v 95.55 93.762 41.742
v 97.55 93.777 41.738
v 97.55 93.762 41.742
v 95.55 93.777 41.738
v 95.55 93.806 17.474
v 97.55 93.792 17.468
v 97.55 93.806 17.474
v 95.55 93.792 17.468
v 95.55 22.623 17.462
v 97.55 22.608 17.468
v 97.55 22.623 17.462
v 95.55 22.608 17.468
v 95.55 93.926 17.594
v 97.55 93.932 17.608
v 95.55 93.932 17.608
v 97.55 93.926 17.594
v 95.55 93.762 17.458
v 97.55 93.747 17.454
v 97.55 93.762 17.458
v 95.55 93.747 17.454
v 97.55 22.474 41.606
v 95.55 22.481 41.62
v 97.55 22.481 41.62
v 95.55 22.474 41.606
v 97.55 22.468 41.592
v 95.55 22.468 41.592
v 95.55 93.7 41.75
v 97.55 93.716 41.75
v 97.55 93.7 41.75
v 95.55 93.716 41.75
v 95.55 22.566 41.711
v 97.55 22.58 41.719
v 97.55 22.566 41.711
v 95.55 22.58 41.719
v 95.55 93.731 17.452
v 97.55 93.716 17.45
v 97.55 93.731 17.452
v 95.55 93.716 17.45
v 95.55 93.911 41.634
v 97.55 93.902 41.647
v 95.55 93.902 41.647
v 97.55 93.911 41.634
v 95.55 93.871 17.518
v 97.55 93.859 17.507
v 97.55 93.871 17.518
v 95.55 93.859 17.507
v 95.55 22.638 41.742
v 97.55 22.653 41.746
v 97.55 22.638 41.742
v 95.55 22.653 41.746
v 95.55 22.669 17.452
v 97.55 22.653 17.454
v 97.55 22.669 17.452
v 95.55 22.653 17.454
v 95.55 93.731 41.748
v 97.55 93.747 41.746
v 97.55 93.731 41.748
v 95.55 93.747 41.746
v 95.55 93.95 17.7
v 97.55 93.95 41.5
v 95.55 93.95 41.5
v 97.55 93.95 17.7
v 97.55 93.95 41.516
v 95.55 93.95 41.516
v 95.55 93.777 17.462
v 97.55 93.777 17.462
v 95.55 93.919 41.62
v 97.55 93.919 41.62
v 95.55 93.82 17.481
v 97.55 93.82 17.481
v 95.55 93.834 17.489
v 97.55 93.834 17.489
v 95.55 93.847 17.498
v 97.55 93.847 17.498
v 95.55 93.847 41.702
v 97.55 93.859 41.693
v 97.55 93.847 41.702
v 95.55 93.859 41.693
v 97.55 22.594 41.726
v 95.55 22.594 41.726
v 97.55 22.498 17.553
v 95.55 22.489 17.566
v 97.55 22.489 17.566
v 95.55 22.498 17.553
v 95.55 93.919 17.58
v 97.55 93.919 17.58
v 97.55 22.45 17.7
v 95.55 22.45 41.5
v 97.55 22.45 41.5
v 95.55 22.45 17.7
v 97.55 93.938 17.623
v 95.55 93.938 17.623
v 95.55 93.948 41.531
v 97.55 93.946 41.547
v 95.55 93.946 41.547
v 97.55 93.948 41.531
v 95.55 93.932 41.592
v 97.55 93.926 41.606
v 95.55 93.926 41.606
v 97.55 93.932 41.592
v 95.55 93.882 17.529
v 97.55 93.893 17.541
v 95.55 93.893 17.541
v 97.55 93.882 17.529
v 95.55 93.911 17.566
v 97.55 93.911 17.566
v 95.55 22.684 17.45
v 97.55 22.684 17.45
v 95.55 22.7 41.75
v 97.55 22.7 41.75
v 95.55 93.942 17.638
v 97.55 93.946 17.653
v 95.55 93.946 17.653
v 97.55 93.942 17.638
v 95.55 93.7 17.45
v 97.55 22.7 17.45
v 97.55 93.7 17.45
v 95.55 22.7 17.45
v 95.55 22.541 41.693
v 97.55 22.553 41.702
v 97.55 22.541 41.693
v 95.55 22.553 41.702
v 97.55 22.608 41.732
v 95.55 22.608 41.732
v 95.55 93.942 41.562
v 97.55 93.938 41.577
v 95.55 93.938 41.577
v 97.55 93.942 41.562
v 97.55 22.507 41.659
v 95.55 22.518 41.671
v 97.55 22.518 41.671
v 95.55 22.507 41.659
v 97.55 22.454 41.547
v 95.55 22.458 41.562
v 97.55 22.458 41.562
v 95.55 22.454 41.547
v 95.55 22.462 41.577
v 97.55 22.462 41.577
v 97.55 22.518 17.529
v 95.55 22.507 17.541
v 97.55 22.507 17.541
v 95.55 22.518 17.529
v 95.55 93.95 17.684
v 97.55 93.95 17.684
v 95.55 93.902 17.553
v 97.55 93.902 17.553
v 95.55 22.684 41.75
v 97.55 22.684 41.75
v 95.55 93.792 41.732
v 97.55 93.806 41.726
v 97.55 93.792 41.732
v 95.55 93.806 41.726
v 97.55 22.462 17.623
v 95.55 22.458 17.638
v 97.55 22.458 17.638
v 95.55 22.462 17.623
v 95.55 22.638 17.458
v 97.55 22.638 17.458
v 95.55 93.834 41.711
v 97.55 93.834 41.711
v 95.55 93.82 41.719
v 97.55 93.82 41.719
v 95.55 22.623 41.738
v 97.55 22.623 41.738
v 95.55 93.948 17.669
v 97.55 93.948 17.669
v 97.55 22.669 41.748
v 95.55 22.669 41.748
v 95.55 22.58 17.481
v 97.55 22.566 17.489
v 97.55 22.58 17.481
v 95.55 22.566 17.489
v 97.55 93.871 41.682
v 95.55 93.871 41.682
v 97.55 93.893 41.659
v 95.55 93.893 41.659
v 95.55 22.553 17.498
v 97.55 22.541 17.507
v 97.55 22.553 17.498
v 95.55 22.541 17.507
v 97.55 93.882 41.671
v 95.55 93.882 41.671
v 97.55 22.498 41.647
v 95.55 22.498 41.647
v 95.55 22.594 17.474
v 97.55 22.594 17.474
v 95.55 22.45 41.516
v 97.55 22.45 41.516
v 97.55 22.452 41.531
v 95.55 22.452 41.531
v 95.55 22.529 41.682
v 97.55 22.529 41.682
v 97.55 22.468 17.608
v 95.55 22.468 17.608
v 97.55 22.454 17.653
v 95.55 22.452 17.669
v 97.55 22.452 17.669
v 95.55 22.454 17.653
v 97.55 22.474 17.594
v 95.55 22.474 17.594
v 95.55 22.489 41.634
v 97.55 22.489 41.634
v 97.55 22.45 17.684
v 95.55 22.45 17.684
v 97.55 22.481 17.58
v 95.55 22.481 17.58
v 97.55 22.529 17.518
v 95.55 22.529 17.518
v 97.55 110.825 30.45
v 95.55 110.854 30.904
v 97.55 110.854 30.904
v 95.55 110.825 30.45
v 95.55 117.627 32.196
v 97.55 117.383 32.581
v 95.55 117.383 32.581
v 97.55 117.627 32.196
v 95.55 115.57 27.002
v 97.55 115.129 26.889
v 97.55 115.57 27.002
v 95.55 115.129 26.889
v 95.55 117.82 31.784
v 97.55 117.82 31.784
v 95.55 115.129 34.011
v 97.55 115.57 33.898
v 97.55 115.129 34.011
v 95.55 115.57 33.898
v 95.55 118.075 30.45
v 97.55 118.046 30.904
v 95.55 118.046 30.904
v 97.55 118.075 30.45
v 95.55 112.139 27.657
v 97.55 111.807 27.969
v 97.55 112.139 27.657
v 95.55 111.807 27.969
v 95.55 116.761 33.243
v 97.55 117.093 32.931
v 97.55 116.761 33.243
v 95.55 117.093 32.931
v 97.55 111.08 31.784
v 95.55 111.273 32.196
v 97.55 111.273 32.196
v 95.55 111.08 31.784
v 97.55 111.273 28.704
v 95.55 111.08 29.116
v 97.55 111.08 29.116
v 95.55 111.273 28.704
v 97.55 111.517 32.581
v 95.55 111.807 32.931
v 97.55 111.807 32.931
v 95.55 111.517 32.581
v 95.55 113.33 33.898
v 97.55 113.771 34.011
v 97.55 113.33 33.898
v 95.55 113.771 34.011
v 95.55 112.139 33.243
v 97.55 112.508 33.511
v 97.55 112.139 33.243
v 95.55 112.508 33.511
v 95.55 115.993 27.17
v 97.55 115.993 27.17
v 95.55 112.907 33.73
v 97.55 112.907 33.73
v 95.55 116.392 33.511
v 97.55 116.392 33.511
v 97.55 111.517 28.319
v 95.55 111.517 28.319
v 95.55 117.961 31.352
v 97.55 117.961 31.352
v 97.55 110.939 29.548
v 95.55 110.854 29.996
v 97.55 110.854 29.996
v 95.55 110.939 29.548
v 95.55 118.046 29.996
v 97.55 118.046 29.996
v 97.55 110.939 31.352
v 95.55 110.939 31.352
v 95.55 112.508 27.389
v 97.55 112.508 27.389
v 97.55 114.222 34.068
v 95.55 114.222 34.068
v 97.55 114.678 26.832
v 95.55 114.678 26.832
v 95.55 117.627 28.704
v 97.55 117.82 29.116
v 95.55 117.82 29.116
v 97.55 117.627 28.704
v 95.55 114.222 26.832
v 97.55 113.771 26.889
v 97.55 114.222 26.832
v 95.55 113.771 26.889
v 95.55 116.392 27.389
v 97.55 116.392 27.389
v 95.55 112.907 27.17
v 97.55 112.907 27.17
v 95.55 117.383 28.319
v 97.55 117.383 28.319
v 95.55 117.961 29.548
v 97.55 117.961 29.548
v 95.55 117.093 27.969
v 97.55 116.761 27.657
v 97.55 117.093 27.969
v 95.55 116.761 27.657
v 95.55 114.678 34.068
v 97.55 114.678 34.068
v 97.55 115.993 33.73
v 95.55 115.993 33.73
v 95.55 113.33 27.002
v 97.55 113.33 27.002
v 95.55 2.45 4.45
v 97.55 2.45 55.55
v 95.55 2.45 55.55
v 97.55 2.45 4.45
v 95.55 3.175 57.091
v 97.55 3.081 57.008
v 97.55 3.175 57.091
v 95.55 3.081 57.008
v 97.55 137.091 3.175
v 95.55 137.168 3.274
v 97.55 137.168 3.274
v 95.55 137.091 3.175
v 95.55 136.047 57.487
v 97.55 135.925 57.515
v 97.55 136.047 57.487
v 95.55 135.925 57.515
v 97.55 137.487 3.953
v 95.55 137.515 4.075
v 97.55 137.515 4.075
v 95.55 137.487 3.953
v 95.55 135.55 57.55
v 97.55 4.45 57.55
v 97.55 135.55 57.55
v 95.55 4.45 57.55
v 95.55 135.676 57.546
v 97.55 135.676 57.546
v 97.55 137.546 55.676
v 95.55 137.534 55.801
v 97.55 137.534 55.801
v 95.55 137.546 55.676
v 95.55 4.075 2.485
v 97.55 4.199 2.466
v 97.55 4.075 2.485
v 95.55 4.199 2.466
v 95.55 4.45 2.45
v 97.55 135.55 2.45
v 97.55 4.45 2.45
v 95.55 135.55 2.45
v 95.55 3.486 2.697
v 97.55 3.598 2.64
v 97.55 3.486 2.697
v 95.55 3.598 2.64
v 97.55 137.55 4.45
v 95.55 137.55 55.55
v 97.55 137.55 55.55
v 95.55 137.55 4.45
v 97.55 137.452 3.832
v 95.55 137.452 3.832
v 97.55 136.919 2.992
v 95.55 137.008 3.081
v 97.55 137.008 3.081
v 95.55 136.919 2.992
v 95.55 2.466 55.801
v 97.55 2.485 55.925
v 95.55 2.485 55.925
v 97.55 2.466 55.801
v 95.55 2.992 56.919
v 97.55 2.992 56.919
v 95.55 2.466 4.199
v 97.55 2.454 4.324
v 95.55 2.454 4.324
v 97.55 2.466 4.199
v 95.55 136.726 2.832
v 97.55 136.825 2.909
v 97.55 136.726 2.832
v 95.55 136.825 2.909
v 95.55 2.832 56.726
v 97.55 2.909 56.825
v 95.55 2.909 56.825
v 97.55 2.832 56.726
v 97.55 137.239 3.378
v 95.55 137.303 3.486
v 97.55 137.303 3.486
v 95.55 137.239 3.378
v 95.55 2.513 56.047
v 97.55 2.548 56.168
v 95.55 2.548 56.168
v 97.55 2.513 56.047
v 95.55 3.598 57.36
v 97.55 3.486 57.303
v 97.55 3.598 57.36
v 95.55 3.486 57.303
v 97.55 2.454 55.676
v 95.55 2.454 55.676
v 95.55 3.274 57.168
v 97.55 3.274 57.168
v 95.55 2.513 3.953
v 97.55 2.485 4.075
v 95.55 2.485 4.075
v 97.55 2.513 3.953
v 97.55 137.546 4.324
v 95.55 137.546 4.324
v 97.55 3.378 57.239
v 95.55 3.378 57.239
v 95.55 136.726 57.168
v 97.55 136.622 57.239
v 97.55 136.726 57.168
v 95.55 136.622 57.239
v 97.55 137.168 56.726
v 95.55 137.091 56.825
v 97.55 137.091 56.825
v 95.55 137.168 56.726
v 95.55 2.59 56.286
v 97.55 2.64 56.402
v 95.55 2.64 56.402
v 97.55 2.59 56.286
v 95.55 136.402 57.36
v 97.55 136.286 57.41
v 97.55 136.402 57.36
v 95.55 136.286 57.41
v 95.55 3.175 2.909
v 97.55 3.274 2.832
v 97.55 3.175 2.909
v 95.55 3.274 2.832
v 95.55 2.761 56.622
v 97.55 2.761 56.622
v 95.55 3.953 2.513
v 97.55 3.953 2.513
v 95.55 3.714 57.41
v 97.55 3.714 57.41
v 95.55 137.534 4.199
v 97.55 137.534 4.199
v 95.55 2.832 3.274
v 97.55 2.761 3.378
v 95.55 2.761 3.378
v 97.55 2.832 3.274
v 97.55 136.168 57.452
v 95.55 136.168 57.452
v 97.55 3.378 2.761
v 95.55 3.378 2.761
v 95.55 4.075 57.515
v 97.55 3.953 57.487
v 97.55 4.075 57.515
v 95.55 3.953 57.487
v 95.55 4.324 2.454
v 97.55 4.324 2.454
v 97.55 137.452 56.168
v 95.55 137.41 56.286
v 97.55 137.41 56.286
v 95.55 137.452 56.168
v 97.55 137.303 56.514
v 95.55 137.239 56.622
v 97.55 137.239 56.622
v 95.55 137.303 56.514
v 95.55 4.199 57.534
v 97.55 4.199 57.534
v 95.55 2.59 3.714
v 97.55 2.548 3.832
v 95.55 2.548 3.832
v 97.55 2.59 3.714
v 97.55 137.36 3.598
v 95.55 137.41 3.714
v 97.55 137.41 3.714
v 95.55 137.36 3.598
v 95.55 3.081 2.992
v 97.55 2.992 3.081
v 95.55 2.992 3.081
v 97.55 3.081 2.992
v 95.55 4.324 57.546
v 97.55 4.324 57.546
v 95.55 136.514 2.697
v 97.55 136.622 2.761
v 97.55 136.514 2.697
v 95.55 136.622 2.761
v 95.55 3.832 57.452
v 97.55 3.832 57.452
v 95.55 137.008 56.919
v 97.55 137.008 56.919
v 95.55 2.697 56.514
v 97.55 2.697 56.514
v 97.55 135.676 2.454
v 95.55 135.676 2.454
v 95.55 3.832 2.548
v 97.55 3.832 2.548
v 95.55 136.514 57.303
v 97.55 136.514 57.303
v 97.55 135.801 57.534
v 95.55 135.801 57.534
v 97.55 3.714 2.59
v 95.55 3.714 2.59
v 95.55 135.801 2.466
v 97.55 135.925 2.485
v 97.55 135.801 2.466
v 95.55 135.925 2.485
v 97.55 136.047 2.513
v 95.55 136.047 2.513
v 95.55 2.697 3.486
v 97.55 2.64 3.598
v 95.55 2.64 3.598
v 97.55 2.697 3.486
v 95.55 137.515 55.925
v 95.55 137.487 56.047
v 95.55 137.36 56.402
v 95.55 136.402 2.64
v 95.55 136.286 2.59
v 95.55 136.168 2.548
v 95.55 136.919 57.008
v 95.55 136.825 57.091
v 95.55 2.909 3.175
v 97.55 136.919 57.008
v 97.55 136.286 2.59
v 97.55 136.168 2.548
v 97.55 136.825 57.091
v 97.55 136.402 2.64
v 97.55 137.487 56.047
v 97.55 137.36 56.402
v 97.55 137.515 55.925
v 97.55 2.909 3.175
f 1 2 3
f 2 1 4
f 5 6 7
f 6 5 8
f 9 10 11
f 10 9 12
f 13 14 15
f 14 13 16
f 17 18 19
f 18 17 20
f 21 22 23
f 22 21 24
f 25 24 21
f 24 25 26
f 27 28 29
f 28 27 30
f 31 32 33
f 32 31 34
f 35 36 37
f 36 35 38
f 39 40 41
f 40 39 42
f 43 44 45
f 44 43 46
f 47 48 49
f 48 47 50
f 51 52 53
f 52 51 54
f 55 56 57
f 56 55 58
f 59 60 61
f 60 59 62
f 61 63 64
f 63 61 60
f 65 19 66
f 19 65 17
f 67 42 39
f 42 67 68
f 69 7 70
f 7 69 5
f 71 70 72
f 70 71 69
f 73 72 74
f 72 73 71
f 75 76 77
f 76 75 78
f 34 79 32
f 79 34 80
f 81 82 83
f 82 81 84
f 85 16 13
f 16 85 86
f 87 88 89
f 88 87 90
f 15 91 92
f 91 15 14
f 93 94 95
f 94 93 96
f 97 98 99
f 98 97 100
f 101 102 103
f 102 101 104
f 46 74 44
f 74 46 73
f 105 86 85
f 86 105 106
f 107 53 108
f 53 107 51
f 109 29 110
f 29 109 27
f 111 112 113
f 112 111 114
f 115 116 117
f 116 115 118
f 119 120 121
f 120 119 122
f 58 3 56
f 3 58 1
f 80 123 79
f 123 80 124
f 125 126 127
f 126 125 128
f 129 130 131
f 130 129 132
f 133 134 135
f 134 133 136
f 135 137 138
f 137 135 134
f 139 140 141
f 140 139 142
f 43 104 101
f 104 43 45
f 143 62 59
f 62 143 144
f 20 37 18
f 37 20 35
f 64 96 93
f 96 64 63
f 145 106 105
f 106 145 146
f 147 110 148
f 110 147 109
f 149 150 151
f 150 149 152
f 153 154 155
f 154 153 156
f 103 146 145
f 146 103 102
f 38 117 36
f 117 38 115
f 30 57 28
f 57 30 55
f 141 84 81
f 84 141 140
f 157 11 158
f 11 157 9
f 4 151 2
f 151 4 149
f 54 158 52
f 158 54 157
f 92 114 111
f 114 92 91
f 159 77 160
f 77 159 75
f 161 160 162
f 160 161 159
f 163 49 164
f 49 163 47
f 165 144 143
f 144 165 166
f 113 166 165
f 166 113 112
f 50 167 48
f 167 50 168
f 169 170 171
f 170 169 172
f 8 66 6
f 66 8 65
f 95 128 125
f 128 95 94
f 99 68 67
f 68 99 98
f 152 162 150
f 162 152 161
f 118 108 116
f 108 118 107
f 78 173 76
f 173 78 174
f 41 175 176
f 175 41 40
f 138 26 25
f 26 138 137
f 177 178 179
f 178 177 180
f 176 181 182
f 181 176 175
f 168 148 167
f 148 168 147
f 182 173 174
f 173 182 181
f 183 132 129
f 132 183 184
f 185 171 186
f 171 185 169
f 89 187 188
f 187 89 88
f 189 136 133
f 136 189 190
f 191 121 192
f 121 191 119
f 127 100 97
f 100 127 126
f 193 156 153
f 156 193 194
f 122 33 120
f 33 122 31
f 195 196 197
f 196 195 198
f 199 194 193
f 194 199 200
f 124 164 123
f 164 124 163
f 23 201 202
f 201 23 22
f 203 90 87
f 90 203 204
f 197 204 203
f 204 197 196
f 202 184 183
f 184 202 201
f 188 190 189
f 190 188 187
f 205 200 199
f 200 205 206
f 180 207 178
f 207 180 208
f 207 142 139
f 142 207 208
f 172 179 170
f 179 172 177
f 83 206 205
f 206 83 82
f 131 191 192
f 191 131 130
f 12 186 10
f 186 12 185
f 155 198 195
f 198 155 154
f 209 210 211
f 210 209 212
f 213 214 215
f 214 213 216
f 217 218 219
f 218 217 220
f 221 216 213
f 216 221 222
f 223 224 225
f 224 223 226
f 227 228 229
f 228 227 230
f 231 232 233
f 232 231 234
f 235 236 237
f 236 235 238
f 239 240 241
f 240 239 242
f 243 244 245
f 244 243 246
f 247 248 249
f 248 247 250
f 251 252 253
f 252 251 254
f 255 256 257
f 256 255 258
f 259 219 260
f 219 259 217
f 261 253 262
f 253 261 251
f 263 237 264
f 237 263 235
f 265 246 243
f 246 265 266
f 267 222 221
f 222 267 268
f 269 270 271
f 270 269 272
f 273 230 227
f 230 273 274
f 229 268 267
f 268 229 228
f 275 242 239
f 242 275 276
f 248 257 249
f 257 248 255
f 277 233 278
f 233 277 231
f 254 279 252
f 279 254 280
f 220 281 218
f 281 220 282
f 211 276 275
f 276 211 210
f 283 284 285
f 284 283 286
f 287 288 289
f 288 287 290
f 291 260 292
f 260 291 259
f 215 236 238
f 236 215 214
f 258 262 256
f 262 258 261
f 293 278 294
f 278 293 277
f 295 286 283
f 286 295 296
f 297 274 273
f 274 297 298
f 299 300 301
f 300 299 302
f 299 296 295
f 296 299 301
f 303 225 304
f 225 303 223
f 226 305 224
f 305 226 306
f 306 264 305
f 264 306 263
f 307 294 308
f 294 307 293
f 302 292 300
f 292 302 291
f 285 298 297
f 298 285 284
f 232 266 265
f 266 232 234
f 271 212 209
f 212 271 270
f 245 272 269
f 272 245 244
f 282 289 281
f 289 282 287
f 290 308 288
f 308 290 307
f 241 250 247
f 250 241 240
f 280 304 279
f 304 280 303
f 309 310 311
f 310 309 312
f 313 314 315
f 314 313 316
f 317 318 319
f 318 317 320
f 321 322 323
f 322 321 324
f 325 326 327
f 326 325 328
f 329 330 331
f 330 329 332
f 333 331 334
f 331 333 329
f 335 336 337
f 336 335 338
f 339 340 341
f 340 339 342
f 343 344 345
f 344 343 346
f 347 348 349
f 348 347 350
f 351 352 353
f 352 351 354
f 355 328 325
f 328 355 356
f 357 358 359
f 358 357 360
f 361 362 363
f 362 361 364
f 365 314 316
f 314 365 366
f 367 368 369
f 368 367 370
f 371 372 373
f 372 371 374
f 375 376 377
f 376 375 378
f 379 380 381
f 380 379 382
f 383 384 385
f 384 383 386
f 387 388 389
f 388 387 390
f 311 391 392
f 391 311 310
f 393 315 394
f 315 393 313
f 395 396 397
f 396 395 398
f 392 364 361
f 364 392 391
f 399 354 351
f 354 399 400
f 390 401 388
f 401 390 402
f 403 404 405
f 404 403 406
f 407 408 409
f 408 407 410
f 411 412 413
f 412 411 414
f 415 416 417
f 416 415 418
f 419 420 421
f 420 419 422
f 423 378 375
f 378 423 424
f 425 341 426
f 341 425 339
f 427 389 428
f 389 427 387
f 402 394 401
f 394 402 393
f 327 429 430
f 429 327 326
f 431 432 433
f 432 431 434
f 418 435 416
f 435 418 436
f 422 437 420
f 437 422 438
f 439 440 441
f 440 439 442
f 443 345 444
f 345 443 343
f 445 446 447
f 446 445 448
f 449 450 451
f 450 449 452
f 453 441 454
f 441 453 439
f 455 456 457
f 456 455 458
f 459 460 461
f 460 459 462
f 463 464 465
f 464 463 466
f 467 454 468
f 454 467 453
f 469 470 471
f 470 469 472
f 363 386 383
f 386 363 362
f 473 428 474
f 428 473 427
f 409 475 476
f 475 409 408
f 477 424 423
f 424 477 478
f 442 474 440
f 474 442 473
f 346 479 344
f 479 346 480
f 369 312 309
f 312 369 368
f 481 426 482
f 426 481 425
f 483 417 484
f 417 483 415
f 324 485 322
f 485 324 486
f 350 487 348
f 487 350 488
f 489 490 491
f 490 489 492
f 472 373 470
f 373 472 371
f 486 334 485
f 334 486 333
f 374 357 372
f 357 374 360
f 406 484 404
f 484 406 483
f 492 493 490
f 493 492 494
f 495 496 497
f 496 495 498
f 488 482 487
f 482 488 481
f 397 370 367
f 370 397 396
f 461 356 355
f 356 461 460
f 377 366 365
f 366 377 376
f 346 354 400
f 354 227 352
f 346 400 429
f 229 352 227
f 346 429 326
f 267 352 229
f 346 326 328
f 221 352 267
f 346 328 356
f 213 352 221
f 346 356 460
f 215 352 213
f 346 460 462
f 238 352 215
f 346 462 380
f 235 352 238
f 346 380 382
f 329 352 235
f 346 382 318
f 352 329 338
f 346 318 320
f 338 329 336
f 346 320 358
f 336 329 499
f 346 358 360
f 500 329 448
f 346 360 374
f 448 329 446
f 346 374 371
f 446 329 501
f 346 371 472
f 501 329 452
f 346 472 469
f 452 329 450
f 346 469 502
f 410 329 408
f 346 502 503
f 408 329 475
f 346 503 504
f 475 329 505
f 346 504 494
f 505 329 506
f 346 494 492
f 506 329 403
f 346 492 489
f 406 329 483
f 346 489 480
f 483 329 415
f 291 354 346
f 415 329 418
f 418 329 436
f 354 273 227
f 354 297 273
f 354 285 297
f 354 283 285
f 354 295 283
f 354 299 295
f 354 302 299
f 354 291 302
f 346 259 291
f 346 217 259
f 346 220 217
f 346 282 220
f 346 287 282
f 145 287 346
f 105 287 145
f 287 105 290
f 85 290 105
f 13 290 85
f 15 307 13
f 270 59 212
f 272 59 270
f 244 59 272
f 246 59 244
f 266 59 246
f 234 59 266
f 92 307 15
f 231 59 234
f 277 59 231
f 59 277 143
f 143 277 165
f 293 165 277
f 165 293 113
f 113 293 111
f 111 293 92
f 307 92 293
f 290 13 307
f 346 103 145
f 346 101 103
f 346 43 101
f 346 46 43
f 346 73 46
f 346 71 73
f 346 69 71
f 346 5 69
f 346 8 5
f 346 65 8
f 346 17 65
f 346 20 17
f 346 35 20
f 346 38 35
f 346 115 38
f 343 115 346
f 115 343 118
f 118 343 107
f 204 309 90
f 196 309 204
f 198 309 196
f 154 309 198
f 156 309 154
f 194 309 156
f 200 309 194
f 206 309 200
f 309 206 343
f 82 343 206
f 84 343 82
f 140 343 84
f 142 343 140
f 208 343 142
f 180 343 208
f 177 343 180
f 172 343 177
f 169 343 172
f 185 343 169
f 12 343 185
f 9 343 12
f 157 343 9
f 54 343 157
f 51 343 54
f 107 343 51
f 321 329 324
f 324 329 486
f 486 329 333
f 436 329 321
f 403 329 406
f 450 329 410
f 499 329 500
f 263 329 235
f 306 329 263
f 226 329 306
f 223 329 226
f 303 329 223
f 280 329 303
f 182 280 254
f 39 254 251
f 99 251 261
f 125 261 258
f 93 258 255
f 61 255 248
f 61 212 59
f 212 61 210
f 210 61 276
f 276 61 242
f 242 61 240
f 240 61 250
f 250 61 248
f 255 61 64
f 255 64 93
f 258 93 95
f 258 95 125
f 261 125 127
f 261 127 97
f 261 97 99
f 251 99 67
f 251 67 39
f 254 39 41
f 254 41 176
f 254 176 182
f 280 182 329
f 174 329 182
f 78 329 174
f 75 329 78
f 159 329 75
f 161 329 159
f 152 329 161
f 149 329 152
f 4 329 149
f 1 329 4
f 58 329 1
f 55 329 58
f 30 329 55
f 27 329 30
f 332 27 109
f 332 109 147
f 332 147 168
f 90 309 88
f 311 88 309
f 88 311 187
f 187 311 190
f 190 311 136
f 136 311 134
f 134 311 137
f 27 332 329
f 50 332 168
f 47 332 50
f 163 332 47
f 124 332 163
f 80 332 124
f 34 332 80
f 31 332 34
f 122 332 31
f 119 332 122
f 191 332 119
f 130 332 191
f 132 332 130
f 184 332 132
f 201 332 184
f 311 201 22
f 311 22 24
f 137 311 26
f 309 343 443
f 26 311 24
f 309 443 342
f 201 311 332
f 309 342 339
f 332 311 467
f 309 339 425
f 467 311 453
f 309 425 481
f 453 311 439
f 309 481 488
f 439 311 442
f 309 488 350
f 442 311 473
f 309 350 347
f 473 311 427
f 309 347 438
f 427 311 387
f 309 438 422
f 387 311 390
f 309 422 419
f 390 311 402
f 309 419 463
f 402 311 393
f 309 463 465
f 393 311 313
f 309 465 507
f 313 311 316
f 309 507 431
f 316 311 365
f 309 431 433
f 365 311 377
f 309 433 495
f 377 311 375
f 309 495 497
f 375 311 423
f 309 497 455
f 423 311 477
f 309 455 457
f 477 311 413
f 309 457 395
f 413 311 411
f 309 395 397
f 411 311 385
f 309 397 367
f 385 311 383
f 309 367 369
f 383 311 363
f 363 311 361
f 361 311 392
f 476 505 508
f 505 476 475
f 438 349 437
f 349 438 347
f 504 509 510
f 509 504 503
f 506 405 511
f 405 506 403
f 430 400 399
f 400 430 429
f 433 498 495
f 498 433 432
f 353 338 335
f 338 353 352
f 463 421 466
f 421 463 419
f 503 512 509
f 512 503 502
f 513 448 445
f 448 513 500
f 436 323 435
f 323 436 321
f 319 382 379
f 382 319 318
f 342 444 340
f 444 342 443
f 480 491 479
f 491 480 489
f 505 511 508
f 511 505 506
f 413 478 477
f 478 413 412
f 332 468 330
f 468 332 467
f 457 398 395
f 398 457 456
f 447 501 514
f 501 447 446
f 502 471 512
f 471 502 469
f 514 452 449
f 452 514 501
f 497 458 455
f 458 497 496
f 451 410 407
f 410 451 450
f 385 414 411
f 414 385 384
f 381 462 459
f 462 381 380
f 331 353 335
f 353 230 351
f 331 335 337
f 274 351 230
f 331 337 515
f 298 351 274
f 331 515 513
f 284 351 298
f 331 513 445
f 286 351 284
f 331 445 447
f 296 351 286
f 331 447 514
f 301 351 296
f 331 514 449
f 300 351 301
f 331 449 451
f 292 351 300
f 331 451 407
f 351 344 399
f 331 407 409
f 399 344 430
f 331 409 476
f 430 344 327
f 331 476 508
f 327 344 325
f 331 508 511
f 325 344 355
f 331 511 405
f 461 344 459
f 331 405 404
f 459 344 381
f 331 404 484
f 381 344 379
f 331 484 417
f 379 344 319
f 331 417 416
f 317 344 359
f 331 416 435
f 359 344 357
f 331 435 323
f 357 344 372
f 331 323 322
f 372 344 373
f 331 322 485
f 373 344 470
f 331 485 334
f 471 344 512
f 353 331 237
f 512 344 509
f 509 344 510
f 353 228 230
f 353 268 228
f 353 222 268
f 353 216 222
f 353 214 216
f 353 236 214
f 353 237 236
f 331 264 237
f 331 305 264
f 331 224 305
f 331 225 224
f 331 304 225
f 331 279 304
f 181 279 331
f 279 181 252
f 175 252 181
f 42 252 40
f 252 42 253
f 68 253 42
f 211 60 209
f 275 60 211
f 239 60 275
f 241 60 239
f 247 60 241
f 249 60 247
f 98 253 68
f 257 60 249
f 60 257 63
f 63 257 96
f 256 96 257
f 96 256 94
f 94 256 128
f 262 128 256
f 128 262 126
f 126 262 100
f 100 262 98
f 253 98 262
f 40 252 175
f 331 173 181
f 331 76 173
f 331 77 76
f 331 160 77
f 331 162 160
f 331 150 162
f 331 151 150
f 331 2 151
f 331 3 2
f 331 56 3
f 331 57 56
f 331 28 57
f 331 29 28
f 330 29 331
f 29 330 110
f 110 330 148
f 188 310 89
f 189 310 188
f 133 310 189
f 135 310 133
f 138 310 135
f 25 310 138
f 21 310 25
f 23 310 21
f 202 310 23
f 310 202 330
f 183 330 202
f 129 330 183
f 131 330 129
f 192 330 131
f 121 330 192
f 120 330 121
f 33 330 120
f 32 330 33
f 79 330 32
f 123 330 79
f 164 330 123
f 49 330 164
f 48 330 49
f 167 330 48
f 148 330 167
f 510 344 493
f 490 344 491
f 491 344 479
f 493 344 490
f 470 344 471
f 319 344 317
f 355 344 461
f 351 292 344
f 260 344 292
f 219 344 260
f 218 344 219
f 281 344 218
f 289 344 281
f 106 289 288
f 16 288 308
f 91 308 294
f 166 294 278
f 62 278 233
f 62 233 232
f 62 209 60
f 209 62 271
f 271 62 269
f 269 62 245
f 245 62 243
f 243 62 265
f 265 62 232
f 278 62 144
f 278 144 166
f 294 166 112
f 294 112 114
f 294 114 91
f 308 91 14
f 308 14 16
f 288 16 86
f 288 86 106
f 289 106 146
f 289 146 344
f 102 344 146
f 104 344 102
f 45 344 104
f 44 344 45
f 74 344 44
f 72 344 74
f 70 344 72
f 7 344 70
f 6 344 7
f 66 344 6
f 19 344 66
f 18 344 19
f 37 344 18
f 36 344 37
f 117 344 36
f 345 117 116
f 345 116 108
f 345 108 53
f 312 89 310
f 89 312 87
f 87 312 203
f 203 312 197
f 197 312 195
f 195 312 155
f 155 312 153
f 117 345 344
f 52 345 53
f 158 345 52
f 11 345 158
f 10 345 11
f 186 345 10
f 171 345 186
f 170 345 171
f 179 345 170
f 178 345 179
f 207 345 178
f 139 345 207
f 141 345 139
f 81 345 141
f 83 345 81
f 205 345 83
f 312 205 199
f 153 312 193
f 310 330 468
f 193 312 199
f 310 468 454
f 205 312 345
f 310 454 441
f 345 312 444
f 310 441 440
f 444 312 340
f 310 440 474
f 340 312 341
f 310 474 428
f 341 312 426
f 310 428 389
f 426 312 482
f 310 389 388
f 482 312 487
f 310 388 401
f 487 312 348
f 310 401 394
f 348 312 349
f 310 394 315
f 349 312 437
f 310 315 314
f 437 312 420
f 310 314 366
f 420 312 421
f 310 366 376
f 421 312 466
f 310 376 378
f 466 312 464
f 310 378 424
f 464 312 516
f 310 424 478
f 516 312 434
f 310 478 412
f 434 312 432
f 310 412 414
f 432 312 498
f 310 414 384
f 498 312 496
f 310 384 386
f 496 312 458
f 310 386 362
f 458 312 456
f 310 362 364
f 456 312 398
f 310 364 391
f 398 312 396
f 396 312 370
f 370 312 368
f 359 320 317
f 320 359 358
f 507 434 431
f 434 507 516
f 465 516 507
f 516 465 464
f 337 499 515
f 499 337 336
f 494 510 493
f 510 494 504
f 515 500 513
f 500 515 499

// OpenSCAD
/*//////////////////////////////////////////////////////////////////
              -    FB Aka Heartman/Hearty 2016     -                   
              -   http://heartygfx.blogspot.com    -                  
              -       OpenScad Parametric Box      -                     
              -         CC BY-NC 3.0 License       -                      
////////////////////////////////////////////////////////////////////                                                                                                             
12/02/2016 - Fixed minor bug 
28/02/2016 - Added holes ventilation option                    
09/03/2016 - Added PCB feet support, fixed the shell artefact on export mode. 

*/////////////////////////// - Info - //////////////////////////////

// All coordinates are starting as integrated circuit pins.
// From the top view :

//   CoordD           <---       CoordC
//                                 ^
//                                 ^
//                                 ^
//   CoordA           --->       CoordB


////////////////////////////////////////////////////////////////////


////////// - Paramètres de la boite - Box parameters - /////////////

/* [Box dimensions] */
// - Longueur - Length  
  Length        = 100;       
// - Largeur - Width
  Width         = 140;                     
// - Hauteur - Height  
  Height        = 60;  
// - Epaisseur - Wall thickness  
  Thick         = 2;//[2:5]  
  
/* [Box options] */
// - Diamètre Coin arrondi - Filet diameter  
  Filet         = 2;//[0.1:12] 
// - lissage de l'arrondi - Filet smoothness  
  Resolution    = 50;//[1:100] 
// - Tolérance - Tolerance (Panel/rails gap)
  m             = 0.9;
// Pieds PCB - PCB feet (x4) 
  PCBFeet       = 0;// [0:No, 1:Yes]
// - Decorations to ventilation holes
  Vent          = 1;// [0:No, 1:Yes]
// - Decoration-Holes width (in mm)
  Vent_width    = 1.5;   


  
/* [PCB_Feet] */
//All dimensions are from the center foot axis

// - Coin bas gauche - Low left corner X position
PCBPosX         = -1;
// - Coin bas gauche - Low left corner Y position
PCBPosY         =  10;
// - Longueur PCB - PCB Length
PCBLength       = 55;
// - Largeur PCB - PCB Width
PCBWidth        = 75;
// - Heuteur pied - Feet height
FootHeight      = 10;
// - Diamètre pied - Foot diameter
FootDia         = 5;
// - Diamètre trou - Hole diameter
FootHole        = 2;  
  

/* [STL element to export] */
//Coque haut - Top shell
TShell          = 0;// [0:No, 1:Yes]
//Coque bas- Bottom shell
BShell          = 0;// [0:No, 1:Yes]
//Panneau avant - Front panel
FPanL           = 1;// [0:No, 1:Yes]
//Panneau arrière - Back panel  
BPanL           = 0;// [0:No, 1:Yes]


  
/* [Hidden] */
// - Couleur coque - Shell color  
Couleur1        = "Orange";       
// - Couleur panneaux - Panels color    
Couleur2        = "OrangeRed";    
// Thick X 2 - making decorations thicker if it is a vent to make sure they go through shell
Dec_Thick       = Vent ? Thick*2 : Thick; 
// - Depth decoration
Dec_size        = Vent ? Thick*2 : 0.8;





/////////// - Boitier générique bord arrondis - Generic rounded box - //////////

module RoundBox($a=Length, $b=Width, $c=Height){// Cube bords arrondis
                    $fn=Resolution;            
                    translate([0,Filet,Filet]){  
                    minkowski (){                                              
                        cube ([$a-(Length/2),$b-(2*Filet),$c-(2*Filet)], center = false);
                        rotate([0,90,0]){    
                        cylinder(r=Filet,h=Length/2, center = false);
                            } 
                        }
                    }
                }// End of RoundBox Module

      
////////////////////////////////// - Module Coque/Shell - //////////////////////////////////         

module Coque(){//Coque - Shell  
    Thick = Thick*2;  
    difference(){    
        difference(){//sides decoration
            union(){    
                     difference() {//soustraction de la forme centrale - Substraction Fileted box
                      
                        difference(){//soustraction cube median - Median cube slicer
                            union() {//union               
                            difference(){//Coque    
                                RoundBox();
                                translate([Thick/2,Thick/2,Thick/2]){     
                                        RoundBox($a=Length-Thick, $b=Width-Thick, $c=Height-Thick);
                                        }
                                        }//Fin diff Coque                            
                                difference(){//largeur Rails        
                                     translate([Thick+m,Thick/2,Thick/2]){// Rails
                                          RoundBox($a=Length-((2*Thick)+(2*m)), $b=Width-Thick, $c=Height-(Thick*2));
                                                          }//fin Rails
                                     translate([((Thick+m/2)*1.55),Thick/2,Thick/2+0.1]){ // +0.1 added to avoid the artefact
                                          RoundBox($a=Length-((Thick*3)+2*m), $b=Width-Thick, $c=Height-Thick);
                                                    }           
                                                }//Fin largeur Rails
                                    }//Fin union                                   
                               translate([-Thick,-Thick,Height/2]){// Cube à soustraire
                                    cube ([Length+100, Width+100, Height], center=false);
                                            }                                            
                                      }//fin soustraction cube median - End Median cube slicer
                               translate([-Thick/2,Thick,Thick]){// Forme de soustraction centrale 
                                    RoundBox($a=Length+Thick, $b=Width-Thick*2, $c=Height-Thick);       
                                    }                          
                                }                                          


                difference(){// wall fixation box legs
                    union(){
                        translate([3*Thick +5,Thick,Height/2]){
                            rotate([90,0,0]){
                                    $fn=6;
                                    cylinder(d=16,Thick/2);
                                    }   
                            }
                            
                       translate([Length-((3*Thick)+5),Thick,Height/2]){
                            rotate([90,0,0]){
                                    $fn=6;
                                    cylinder(d=16,Thick/2);
                                    }   
                            }

                        }
                            translate([4,Thick+Filet,Height/2-57]){   
                             rotate([45,0,0]){
                                   cube([Length,40,40]);    
                                  }
                           }
                           translate([0,-(Thick*1.46),Height/2]){
                                cube([Length,Thick*2,10]);
                           }
                    } //Fin fixation box legs
            }

        union(){// outbox sides decorations
            
            for(i=[0:Thick:Length/4]){

                // Ventilation holes part code submitted by Ettie - Thanks ;) 
                    translate([10+i,-Dec_Thick+Dec_size,1]){
                    cube([Vent_width,Dec_Thick,Height/4]);
                    }
                    translate([(Length-10) - i,-Dec_Thick+Dec_size,1]){
                    cube([Vent_width,Dec_Thick,Height/4]);
                    }
                    translate([(Length-10) - i,Width-Dec_size,1]){
                    cube([Vent_width,Dec_Thick,Height/4]);
                    }
                    translate([10+i,Width-Dec_size,1]){
                    cube([Vent_width,Dec_Thick,Height/4]);
                    }
  
                
                    }// fin de for
               // }
                }//fin union decoration
            }//fin difference decoration


            union(){ //sides holes
                $fn=50;
                translate([3*Thick+5,20,Height/2+4]){
                    rotate([90,0,0]){
                    cylinder(d=2,20);
                    }
                }
                translate([Length-((3*Thick)+5),20,Height/2+4]){
                    rotate([90,0,0]){
                    cylinder(d=2,20);
                    }
                }
                translate([3*Thick+5,Width+5,Height/2-4]){
                    rotate([90,0,0]){
                    cylinder(d=2,20);
                    }
                }
                translate([Length-((3*Thick)+5),Width+5,Height/2-4]){
                    rotate([90,0,0]){
                    cylinder(d=2,20);
                    }
                }
            }//fin de sides holes

        }//fin de difference holes
}// fin coque 

////////////////////////////// - Experiment - ///////////////////////////////////////////





/////////////////////// - Foot with base filet - /////////////////////////////
module foot(FootDia,FootHole,FootHeight){
    Filet=2;
    color(Couleur1)   
    translate([0,0,Filet-1.5])
    difference(){
    
    difference(){
            //translate ([0,0,-Thick]){
                cylinder(d=FootDia+Filet,FootHeight-Thick, $fn=100);
                        //}
                    rotate_extrude($fn=100){
                            translate([(FootDia+Filet*2)/2,Filet,0]){
                                    minkowski(){
                                            square(10);
                                            circle(Filet, $fn=100);
                                        }
                                 }
                           }
                   }
            cylinder(d=FootHole,FootHeight+1, $fn=100);
               }          
}// Fin module foot
  
module Feet(){     
//////////////////// - PCB only visible in the preview mode - /////////////////////    
    translate([3*Thick+2,Thick+5,FootHeight+(Thick/2)-0.5]){
    
    %square ([PCBLength+10,PCBWidth+10]);
       translate([PCBLength/2,PCBWidth/2,0.5]){ 
        color("Olive")
        %text("PCB", halign="center", valign="center", font="Arial black");
       }
    } // Fin PCB 
  
    
////////////////////////////// - 4 Feet - //////////////////////////////////////////     
    translate([3*Thick+7,Thick+10,Thick/2]){
        foot(FootDia,FootHole,FootHeight);
    }
    translate([(3*Thick)+PCBLength+7,Thick+10,Thick/2]){
        foot(FootDia,FootHole,FootHeight);
        }
    translate([(3*Thick)+PCBLength+7,(Thick)+PCBWidth+10,Thick/2]){
        foot(FootDia,FootHole,FootHeight);
        }        
    translate([3*Thick+7,(Thick)+PCBWidth+10,Thick/2]){
        foot(FootDia,FootHole,FootHeight);
    }   

} // Fin du module Feet
 


 
 ////////////////////////////////////////////////////////////////////////
////////////////////// <- Holes Panel Manager -> ///////////////////////
////////////////////////////////////////////////////////////////////////

//                           <- Panel ->  
module Panel(Length,Width,Thick,Filet){
    scale([0.5,1,1])
    minkowski(){
            cube([Thick,Width-(Thick*2+Filet*2+m),Height-(Thick*2+Filet*2+m)]);
            translate([0,Filet,Filet])
            rotate([0,90,0])
            cylinder(r=Filet,h=Thick, $fn=100);
      }
}



//                          <- Circle hole -> 
// Cx=Cylinder X position | Cy=Cylinder Y position | Cdia= Cylinder dia | Cheight=Cyl height
module CylinderHole(OnOff,Cx,Cy,Cdia){
    if(OnOff==1)
    translate([Cx,Cy,-1])
        cylinder(d=Cdia,10, $fn=50);
}
//                          <- Square hole ->  
// Sx=Square X position | Sy=Square Y position | Sl= Square Length | Sw=Square Width | Filet = Round corner
module SquareHole(OnOff,Sx,Sy,Sl,Sw,Filet){
    if(OnOff==1)
     minkowski(){
        translate([Sx+Filet/2,Sy+Filet/2,-1])
            cube([Sl-Filet,Sw-Filet,10]);
            cylinder(d=Filet,h=10, $fn=100);
       }
}


 
//                      <- Linear text panel -> 
module LText(OnOff,Tx,Ty,Font,Size,Content){
    if(OnOff==1)
    translate([Tx,Ty,Thick+.5])
    linear_extrude(height = 0.5){
    text(Content, size=Size, font=Font);
    }
}
//                     <- Circular text panel->  
module CText(OnOff,Tx,Ty,Font,Size,TxtRadius,Angl,Turn,Content){ 
      if(OnOff==1) {
      Angle = -Angl / len(Content);
      translate([Tx,Ty,Thick+.5])
          for (i= [0:len(Content)-1] ){   
              rotate([0,0,i*Angle+90+Turn])
              translate([0,TxtRadius,0]) {
                linear_extrude(height = 0.5){
                text(Content[i], font = Font, size = Size,  valign ="baseline", halign ="center");
                    }
                }   
             }
      }
}
////////////////////// <- New module Panel -> //////////////////////
module FPanL(){
    difference(){
        color(Couleur2)
        Panel(Length,Width,Thick,Filet);
    
 
    rotate([90,0,90]){
        color(Couleur2){
//                     <- Cutting shapes from here ->  
       // SquareHole  (1,20,20,15,10,1); //(On/Off, Xpos,Ypos,Length,Width,Filet)
       // SquareHole  (1,40,20,15,10,1);
       // SquareHole  (1,60,20,15,10,1); 
       // CylinderHole(1,27,40,8);       //(On/Off, Xpos, Ypos, Diameter)
       // CylinderHole(1,47,40,8);
       /// CylinderHole(1,67,40,8);
        SquareHole  (1,20,15,71.5,24.3,.5);
        CylinderHole(1,112,28,7.25);
       // SquareHole  (1,120,20,30,60,3);
            
            
       
//                            <- To here -> 
           }
       }
}

    color(Couleur1){
        translate ([-.5,0,0])
        rotate([90,0,90]){
//                      <- Adding text from here ->          
     //   LText(1,20,83,"Arial Black",4,"Digital Screen");//(On/Off, Xpos, Ypos, "Font", Size, "Text")
     //   LText(1,120,83,"Arial Black",4,"Level");
     //   LText(1,20,11,"Arial Black",6,"  1     2      3");
     //   CText(1,93,29,"Arial Black",4,10,180,0,"1 . 2 . 3 . 4 . 5 . 6");//(On/Off, Xpos, Ypos, "Font", Size, Diameter, Arc(Deg), Starting Angle(Deg),"Text")
//                            <- To here ->
            }
      }
}


/////////////////////////// <- Main part -> /////////////////////////

if(TShell==1)
// Coque haut - Top Shell
        color( Couleur1,1){
            translate([0,Width,Height+0.2]){
                rotate([0,180,180]){
                        Coque();
                        }
                }
        }

if(BShell==1)
// Coque bas - Bottom shell
        color(Couleur1){ 
        Coque();
        }

// Pied support PCB - PCB feet
if (PCBFeet==1)
// Feet
        translate([PCBPosX,PCBPosY,0]){ 
        Feet();
        }

// Panneau avant - Front panel  <<<<<< Text and holes only on this one.
//rotate([0,-90,-90]) 
if(FPanL==1)
        translate([Length-(Thick*2+m/2),Thick+m/2,Thick+m/2])
        FPanL();

//Panneau arrière - Back panel
if(BPanL==1)
        color(Couleur2)
        translate([Thick+m/2,Thick+m/2,Thick+m/2])
        Panel(Length,Width,Thick,Filet);
